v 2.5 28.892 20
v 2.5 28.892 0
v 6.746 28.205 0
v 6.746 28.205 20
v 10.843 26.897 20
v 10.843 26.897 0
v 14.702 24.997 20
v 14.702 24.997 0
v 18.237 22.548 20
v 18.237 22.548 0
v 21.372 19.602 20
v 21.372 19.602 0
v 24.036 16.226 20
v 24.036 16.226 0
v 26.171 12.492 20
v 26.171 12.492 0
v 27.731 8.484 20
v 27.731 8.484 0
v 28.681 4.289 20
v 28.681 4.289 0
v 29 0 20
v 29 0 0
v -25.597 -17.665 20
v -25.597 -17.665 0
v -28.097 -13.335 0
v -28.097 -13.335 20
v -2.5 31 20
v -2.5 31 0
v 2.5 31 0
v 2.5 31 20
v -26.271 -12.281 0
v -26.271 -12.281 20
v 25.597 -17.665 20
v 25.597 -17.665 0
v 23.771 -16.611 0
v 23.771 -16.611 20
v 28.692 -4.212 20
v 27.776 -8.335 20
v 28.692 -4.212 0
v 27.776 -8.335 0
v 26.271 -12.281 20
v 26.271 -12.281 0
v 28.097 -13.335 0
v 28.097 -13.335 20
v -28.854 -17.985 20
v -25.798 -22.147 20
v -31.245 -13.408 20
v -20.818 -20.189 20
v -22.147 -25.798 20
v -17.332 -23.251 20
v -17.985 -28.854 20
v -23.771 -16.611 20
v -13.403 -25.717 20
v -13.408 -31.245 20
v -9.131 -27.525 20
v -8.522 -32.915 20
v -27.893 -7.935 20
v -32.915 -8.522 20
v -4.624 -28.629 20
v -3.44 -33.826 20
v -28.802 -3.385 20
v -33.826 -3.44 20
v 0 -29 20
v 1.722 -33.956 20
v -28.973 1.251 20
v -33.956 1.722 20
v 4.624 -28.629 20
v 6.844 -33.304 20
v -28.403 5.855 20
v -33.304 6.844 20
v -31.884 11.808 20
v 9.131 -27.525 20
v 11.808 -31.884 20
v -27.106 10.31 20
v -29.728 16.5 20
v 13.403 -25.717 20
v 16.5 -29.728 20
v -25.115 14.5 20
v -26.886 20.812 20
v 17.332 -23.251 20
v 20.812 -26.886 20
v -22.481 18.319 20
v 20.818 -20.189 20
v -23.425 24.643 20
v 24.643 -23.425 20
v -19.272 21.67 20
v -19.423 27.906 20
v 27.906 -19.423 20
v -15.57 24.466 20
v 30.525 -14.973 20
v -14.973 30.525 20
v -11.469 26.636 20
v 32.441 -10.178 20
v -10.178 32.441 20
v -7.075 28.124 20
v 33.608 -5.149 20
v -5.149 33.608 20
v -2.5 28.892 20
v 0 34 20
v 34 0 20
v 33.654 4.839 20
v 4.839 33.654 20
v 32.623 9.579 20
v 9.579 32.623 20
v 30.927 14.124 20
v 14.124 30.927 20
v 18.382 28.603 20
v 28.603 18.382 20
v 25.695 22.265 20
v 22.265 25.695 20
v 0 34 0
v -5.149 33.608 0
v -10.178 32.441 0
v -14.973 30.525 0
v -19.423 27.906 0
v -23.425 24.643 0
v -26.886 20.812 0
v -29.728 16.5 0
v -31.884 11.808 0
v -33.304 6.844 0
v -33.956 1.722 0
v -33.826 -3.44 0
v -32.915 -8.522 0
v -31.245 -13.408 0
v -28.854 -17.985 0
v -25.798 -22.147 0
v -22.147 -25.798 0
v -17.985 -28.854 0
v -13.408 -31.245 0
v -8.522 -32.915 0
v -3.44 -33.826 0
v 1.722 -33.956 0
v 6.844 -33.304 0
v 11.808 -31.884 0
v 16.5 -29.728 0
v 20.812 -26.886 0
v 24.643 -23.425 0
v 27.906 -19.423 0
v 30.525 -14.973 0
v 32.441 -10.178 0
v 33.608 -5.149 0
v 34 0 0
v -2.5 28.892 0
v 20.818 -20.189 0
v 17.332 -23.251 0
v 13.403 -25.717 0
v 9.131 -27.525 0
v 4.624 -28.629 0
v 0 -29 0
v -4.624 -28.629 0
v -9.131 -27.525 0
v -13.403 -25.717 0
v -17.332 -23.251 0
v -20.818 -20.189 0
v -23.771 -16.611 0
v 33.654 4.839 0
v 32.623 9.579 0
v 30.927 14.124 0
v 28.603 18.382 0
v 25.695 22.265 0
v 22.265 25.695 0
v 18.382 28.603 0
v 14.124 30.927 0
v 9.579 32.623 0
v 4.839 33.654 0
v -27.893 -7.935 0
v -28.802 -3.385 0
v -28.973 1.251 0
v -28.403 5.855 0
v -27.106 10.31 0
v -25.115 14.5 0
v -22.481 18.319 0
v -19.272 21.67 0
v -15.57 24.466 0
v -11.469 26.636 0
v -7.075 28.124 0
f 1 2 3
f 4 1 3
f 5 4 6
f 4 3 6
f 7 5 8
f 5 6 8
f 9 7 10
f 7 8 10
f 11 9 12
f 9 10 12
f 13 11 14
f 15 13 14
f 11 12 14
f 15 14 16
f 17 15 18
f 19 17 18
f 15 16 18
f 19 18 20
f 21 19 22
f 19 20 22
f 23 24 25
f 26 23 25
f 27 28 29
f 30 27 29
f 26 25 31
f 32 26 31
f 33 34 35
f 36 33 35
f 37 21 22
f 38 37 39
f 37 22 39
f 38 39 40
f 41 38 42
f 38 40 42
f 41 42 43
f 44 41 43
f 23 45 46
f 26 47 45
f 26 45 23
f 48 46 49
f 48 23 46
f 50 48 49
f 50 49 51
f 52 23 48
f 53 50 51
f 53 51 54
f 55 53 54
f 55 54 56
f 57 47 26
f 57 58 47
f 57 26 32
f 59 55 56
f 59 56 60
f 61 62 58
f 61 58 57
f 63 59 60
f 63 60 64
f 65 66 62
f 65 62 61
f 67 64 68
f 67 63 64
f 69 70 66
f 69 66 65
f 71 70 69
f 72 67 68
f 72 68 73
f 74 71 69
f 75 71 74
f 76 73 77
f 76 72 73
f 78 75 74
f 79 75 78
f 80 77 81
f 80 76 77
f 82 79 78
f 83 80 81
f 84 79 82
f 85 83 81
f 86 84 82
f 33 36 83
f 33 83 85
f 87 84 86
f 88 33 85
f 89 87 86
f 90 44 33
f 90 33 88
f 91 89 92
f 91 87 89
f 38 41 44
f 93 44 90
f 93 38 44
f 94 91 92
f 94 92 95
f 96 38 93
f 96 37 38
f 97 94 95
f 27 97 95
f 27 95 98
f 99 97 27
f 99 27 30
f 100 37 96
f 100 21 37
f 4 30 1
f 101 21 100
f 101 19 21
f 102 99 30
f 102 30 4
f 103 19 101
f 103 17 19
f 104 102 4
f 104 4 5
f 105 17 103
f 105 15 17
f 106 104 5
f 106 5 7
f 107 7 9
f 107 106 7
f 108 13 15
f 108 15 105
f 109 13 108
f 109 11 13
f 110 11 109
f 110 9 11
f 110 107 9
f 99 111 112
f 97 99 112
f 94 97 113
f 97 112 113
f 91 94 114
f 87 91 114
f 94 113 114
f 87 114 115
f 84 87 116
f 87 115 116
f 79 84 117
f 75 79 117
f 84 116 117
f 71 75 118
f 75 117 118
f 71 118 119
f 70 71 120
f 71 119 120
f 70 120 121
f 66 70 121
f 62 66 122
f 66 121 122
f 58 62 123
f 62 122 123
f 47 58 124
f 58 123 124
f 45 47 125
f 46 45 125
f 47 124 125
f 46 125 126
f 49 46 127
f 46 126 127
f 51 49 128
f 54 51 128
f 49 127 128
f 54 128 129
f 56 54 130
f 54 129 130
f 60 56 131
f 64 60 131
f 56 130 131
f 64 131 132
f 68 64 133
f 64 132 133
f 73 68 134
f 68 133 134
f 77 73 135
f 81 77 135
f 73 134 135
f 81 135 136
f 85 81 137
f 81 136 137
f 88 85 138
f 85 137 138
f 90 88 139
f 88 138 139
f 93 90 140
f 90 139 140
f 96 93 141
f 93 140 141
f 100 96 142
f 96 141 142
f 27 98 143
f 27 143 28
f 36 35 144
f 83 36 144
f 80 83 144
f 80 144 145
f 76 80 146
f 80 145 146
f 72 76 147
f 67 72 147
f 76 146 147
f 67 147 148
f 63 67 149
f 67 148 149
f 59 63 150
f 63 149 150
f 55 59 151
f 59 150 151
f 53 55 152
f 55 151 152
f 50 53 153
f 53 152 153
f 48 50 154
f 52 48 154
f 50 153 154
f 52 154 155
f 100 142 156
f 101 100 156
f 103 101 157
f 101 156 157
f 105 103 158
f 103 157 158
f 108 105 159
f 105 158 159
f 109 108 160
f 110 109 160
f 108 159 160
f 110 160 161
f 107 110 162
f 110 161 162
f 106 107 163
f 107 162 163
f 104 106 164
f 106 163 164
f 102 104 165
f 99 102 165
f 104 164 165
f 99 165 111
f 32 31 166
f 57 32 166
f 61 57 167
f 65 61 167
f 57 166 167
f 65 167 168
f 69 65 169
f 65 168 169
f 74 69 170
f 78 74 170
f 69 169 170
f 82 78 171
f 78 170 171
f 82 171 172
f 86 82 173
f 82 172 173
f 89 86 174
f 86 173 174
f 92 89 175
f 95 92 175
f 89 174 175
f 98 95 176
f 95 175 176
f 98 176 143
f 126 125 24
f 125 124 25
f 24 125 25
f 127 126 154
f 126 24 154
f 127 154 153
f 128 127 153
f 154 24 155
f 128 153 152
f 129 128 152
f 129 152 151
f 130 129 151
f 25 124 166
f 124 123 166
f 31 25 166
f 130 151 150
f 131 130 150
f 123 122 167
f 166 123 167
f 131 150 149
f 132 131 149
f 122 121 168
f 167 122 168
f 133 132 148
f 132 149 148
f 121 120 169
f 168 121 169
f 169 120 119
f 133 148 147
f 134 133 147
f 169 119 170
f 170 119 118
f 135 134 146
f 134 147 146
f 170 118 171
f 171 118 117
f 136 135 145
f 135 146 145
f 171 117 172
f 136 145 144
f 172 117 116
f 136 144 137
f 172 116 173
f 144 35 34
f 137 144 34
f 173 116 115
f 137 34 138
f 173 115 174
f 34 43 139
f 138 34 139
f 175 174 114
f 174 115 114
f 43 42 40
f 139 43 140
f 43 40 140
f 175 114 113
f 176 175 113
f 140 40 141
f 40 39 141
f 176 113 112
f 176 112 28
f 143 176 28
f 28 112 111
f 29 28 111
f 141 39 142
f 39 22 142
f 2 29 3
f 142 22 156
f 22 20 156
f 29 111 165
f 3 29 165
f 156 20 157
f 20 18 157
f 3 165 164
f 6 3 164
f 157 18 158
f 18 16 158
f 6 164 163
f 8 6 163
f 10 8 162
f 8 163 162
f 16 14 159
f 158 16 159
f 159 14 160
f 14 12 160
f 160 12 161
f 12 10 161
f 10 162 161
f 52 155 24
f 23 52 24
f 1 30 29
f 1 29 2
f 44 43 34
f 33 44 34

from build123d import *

# Parameters (mm, degrees)
SALIENTE_EXTRUIR1_DEPTH = 20


with BuildPart() as part:
    # Croquis1 → Saliente-Extruir1 (new body)
    with BuildSketch(Plane.XY):
        with BuildLine():
            ThreePointArc((34, 0), (24.04163056, 24.04163056), (0, 34))
            ThreePointArc((0, 34), (-24.04163056, -24.04163056), (34, 0))
        make_face()
        with BuildLine():
            Line((-2.5, 31), (0, 31))
            Line((0, 31), (2.5, 31))
            Line((2.5, 31), (2.5, 28.892040426))
            ThreePointArc((2.5, 28.892040426), (21.371710273, 19.602295784), (29, 0))
            ThreePointArc((29, 0), (28.309591911, -6.290230985), (26.271240976, -12.280956704))
            Line((26.271240976, -12.280956704), (28.096787517, -13.334936491))
            Line((28.096787517, -13.334936491), (25.596787517, -17.665063509))
            Line((25.596787517, -17.665063509), (23.771240976, -16.611083723))
            ThreePointArc((23.771240976, -16.611083723), (0, -29), (-23.771240976, -16.611083723))
            Line((-23.771240976, -16.611083723), (-25.596787517, -17.665063509))
            Line((-25.596787517, -17.665063509), (-28.096787517, -13.334936491))
            Line((-28.096787517, -13.334936491), (-26.271240976, -12.280956704))
            ThreePointArc((-26.271240976, -12.280956704), (-25.11473671, 14.5), (-2.5, 28.892040426))
            Line((-2.5, 28.892040426), (-2.5, 31))
        make_face(mode=Mode.SUBTRACT)
    extrude(amount=SALIENTE_EXTRUIR1_DEPTH)


solid = part.part
